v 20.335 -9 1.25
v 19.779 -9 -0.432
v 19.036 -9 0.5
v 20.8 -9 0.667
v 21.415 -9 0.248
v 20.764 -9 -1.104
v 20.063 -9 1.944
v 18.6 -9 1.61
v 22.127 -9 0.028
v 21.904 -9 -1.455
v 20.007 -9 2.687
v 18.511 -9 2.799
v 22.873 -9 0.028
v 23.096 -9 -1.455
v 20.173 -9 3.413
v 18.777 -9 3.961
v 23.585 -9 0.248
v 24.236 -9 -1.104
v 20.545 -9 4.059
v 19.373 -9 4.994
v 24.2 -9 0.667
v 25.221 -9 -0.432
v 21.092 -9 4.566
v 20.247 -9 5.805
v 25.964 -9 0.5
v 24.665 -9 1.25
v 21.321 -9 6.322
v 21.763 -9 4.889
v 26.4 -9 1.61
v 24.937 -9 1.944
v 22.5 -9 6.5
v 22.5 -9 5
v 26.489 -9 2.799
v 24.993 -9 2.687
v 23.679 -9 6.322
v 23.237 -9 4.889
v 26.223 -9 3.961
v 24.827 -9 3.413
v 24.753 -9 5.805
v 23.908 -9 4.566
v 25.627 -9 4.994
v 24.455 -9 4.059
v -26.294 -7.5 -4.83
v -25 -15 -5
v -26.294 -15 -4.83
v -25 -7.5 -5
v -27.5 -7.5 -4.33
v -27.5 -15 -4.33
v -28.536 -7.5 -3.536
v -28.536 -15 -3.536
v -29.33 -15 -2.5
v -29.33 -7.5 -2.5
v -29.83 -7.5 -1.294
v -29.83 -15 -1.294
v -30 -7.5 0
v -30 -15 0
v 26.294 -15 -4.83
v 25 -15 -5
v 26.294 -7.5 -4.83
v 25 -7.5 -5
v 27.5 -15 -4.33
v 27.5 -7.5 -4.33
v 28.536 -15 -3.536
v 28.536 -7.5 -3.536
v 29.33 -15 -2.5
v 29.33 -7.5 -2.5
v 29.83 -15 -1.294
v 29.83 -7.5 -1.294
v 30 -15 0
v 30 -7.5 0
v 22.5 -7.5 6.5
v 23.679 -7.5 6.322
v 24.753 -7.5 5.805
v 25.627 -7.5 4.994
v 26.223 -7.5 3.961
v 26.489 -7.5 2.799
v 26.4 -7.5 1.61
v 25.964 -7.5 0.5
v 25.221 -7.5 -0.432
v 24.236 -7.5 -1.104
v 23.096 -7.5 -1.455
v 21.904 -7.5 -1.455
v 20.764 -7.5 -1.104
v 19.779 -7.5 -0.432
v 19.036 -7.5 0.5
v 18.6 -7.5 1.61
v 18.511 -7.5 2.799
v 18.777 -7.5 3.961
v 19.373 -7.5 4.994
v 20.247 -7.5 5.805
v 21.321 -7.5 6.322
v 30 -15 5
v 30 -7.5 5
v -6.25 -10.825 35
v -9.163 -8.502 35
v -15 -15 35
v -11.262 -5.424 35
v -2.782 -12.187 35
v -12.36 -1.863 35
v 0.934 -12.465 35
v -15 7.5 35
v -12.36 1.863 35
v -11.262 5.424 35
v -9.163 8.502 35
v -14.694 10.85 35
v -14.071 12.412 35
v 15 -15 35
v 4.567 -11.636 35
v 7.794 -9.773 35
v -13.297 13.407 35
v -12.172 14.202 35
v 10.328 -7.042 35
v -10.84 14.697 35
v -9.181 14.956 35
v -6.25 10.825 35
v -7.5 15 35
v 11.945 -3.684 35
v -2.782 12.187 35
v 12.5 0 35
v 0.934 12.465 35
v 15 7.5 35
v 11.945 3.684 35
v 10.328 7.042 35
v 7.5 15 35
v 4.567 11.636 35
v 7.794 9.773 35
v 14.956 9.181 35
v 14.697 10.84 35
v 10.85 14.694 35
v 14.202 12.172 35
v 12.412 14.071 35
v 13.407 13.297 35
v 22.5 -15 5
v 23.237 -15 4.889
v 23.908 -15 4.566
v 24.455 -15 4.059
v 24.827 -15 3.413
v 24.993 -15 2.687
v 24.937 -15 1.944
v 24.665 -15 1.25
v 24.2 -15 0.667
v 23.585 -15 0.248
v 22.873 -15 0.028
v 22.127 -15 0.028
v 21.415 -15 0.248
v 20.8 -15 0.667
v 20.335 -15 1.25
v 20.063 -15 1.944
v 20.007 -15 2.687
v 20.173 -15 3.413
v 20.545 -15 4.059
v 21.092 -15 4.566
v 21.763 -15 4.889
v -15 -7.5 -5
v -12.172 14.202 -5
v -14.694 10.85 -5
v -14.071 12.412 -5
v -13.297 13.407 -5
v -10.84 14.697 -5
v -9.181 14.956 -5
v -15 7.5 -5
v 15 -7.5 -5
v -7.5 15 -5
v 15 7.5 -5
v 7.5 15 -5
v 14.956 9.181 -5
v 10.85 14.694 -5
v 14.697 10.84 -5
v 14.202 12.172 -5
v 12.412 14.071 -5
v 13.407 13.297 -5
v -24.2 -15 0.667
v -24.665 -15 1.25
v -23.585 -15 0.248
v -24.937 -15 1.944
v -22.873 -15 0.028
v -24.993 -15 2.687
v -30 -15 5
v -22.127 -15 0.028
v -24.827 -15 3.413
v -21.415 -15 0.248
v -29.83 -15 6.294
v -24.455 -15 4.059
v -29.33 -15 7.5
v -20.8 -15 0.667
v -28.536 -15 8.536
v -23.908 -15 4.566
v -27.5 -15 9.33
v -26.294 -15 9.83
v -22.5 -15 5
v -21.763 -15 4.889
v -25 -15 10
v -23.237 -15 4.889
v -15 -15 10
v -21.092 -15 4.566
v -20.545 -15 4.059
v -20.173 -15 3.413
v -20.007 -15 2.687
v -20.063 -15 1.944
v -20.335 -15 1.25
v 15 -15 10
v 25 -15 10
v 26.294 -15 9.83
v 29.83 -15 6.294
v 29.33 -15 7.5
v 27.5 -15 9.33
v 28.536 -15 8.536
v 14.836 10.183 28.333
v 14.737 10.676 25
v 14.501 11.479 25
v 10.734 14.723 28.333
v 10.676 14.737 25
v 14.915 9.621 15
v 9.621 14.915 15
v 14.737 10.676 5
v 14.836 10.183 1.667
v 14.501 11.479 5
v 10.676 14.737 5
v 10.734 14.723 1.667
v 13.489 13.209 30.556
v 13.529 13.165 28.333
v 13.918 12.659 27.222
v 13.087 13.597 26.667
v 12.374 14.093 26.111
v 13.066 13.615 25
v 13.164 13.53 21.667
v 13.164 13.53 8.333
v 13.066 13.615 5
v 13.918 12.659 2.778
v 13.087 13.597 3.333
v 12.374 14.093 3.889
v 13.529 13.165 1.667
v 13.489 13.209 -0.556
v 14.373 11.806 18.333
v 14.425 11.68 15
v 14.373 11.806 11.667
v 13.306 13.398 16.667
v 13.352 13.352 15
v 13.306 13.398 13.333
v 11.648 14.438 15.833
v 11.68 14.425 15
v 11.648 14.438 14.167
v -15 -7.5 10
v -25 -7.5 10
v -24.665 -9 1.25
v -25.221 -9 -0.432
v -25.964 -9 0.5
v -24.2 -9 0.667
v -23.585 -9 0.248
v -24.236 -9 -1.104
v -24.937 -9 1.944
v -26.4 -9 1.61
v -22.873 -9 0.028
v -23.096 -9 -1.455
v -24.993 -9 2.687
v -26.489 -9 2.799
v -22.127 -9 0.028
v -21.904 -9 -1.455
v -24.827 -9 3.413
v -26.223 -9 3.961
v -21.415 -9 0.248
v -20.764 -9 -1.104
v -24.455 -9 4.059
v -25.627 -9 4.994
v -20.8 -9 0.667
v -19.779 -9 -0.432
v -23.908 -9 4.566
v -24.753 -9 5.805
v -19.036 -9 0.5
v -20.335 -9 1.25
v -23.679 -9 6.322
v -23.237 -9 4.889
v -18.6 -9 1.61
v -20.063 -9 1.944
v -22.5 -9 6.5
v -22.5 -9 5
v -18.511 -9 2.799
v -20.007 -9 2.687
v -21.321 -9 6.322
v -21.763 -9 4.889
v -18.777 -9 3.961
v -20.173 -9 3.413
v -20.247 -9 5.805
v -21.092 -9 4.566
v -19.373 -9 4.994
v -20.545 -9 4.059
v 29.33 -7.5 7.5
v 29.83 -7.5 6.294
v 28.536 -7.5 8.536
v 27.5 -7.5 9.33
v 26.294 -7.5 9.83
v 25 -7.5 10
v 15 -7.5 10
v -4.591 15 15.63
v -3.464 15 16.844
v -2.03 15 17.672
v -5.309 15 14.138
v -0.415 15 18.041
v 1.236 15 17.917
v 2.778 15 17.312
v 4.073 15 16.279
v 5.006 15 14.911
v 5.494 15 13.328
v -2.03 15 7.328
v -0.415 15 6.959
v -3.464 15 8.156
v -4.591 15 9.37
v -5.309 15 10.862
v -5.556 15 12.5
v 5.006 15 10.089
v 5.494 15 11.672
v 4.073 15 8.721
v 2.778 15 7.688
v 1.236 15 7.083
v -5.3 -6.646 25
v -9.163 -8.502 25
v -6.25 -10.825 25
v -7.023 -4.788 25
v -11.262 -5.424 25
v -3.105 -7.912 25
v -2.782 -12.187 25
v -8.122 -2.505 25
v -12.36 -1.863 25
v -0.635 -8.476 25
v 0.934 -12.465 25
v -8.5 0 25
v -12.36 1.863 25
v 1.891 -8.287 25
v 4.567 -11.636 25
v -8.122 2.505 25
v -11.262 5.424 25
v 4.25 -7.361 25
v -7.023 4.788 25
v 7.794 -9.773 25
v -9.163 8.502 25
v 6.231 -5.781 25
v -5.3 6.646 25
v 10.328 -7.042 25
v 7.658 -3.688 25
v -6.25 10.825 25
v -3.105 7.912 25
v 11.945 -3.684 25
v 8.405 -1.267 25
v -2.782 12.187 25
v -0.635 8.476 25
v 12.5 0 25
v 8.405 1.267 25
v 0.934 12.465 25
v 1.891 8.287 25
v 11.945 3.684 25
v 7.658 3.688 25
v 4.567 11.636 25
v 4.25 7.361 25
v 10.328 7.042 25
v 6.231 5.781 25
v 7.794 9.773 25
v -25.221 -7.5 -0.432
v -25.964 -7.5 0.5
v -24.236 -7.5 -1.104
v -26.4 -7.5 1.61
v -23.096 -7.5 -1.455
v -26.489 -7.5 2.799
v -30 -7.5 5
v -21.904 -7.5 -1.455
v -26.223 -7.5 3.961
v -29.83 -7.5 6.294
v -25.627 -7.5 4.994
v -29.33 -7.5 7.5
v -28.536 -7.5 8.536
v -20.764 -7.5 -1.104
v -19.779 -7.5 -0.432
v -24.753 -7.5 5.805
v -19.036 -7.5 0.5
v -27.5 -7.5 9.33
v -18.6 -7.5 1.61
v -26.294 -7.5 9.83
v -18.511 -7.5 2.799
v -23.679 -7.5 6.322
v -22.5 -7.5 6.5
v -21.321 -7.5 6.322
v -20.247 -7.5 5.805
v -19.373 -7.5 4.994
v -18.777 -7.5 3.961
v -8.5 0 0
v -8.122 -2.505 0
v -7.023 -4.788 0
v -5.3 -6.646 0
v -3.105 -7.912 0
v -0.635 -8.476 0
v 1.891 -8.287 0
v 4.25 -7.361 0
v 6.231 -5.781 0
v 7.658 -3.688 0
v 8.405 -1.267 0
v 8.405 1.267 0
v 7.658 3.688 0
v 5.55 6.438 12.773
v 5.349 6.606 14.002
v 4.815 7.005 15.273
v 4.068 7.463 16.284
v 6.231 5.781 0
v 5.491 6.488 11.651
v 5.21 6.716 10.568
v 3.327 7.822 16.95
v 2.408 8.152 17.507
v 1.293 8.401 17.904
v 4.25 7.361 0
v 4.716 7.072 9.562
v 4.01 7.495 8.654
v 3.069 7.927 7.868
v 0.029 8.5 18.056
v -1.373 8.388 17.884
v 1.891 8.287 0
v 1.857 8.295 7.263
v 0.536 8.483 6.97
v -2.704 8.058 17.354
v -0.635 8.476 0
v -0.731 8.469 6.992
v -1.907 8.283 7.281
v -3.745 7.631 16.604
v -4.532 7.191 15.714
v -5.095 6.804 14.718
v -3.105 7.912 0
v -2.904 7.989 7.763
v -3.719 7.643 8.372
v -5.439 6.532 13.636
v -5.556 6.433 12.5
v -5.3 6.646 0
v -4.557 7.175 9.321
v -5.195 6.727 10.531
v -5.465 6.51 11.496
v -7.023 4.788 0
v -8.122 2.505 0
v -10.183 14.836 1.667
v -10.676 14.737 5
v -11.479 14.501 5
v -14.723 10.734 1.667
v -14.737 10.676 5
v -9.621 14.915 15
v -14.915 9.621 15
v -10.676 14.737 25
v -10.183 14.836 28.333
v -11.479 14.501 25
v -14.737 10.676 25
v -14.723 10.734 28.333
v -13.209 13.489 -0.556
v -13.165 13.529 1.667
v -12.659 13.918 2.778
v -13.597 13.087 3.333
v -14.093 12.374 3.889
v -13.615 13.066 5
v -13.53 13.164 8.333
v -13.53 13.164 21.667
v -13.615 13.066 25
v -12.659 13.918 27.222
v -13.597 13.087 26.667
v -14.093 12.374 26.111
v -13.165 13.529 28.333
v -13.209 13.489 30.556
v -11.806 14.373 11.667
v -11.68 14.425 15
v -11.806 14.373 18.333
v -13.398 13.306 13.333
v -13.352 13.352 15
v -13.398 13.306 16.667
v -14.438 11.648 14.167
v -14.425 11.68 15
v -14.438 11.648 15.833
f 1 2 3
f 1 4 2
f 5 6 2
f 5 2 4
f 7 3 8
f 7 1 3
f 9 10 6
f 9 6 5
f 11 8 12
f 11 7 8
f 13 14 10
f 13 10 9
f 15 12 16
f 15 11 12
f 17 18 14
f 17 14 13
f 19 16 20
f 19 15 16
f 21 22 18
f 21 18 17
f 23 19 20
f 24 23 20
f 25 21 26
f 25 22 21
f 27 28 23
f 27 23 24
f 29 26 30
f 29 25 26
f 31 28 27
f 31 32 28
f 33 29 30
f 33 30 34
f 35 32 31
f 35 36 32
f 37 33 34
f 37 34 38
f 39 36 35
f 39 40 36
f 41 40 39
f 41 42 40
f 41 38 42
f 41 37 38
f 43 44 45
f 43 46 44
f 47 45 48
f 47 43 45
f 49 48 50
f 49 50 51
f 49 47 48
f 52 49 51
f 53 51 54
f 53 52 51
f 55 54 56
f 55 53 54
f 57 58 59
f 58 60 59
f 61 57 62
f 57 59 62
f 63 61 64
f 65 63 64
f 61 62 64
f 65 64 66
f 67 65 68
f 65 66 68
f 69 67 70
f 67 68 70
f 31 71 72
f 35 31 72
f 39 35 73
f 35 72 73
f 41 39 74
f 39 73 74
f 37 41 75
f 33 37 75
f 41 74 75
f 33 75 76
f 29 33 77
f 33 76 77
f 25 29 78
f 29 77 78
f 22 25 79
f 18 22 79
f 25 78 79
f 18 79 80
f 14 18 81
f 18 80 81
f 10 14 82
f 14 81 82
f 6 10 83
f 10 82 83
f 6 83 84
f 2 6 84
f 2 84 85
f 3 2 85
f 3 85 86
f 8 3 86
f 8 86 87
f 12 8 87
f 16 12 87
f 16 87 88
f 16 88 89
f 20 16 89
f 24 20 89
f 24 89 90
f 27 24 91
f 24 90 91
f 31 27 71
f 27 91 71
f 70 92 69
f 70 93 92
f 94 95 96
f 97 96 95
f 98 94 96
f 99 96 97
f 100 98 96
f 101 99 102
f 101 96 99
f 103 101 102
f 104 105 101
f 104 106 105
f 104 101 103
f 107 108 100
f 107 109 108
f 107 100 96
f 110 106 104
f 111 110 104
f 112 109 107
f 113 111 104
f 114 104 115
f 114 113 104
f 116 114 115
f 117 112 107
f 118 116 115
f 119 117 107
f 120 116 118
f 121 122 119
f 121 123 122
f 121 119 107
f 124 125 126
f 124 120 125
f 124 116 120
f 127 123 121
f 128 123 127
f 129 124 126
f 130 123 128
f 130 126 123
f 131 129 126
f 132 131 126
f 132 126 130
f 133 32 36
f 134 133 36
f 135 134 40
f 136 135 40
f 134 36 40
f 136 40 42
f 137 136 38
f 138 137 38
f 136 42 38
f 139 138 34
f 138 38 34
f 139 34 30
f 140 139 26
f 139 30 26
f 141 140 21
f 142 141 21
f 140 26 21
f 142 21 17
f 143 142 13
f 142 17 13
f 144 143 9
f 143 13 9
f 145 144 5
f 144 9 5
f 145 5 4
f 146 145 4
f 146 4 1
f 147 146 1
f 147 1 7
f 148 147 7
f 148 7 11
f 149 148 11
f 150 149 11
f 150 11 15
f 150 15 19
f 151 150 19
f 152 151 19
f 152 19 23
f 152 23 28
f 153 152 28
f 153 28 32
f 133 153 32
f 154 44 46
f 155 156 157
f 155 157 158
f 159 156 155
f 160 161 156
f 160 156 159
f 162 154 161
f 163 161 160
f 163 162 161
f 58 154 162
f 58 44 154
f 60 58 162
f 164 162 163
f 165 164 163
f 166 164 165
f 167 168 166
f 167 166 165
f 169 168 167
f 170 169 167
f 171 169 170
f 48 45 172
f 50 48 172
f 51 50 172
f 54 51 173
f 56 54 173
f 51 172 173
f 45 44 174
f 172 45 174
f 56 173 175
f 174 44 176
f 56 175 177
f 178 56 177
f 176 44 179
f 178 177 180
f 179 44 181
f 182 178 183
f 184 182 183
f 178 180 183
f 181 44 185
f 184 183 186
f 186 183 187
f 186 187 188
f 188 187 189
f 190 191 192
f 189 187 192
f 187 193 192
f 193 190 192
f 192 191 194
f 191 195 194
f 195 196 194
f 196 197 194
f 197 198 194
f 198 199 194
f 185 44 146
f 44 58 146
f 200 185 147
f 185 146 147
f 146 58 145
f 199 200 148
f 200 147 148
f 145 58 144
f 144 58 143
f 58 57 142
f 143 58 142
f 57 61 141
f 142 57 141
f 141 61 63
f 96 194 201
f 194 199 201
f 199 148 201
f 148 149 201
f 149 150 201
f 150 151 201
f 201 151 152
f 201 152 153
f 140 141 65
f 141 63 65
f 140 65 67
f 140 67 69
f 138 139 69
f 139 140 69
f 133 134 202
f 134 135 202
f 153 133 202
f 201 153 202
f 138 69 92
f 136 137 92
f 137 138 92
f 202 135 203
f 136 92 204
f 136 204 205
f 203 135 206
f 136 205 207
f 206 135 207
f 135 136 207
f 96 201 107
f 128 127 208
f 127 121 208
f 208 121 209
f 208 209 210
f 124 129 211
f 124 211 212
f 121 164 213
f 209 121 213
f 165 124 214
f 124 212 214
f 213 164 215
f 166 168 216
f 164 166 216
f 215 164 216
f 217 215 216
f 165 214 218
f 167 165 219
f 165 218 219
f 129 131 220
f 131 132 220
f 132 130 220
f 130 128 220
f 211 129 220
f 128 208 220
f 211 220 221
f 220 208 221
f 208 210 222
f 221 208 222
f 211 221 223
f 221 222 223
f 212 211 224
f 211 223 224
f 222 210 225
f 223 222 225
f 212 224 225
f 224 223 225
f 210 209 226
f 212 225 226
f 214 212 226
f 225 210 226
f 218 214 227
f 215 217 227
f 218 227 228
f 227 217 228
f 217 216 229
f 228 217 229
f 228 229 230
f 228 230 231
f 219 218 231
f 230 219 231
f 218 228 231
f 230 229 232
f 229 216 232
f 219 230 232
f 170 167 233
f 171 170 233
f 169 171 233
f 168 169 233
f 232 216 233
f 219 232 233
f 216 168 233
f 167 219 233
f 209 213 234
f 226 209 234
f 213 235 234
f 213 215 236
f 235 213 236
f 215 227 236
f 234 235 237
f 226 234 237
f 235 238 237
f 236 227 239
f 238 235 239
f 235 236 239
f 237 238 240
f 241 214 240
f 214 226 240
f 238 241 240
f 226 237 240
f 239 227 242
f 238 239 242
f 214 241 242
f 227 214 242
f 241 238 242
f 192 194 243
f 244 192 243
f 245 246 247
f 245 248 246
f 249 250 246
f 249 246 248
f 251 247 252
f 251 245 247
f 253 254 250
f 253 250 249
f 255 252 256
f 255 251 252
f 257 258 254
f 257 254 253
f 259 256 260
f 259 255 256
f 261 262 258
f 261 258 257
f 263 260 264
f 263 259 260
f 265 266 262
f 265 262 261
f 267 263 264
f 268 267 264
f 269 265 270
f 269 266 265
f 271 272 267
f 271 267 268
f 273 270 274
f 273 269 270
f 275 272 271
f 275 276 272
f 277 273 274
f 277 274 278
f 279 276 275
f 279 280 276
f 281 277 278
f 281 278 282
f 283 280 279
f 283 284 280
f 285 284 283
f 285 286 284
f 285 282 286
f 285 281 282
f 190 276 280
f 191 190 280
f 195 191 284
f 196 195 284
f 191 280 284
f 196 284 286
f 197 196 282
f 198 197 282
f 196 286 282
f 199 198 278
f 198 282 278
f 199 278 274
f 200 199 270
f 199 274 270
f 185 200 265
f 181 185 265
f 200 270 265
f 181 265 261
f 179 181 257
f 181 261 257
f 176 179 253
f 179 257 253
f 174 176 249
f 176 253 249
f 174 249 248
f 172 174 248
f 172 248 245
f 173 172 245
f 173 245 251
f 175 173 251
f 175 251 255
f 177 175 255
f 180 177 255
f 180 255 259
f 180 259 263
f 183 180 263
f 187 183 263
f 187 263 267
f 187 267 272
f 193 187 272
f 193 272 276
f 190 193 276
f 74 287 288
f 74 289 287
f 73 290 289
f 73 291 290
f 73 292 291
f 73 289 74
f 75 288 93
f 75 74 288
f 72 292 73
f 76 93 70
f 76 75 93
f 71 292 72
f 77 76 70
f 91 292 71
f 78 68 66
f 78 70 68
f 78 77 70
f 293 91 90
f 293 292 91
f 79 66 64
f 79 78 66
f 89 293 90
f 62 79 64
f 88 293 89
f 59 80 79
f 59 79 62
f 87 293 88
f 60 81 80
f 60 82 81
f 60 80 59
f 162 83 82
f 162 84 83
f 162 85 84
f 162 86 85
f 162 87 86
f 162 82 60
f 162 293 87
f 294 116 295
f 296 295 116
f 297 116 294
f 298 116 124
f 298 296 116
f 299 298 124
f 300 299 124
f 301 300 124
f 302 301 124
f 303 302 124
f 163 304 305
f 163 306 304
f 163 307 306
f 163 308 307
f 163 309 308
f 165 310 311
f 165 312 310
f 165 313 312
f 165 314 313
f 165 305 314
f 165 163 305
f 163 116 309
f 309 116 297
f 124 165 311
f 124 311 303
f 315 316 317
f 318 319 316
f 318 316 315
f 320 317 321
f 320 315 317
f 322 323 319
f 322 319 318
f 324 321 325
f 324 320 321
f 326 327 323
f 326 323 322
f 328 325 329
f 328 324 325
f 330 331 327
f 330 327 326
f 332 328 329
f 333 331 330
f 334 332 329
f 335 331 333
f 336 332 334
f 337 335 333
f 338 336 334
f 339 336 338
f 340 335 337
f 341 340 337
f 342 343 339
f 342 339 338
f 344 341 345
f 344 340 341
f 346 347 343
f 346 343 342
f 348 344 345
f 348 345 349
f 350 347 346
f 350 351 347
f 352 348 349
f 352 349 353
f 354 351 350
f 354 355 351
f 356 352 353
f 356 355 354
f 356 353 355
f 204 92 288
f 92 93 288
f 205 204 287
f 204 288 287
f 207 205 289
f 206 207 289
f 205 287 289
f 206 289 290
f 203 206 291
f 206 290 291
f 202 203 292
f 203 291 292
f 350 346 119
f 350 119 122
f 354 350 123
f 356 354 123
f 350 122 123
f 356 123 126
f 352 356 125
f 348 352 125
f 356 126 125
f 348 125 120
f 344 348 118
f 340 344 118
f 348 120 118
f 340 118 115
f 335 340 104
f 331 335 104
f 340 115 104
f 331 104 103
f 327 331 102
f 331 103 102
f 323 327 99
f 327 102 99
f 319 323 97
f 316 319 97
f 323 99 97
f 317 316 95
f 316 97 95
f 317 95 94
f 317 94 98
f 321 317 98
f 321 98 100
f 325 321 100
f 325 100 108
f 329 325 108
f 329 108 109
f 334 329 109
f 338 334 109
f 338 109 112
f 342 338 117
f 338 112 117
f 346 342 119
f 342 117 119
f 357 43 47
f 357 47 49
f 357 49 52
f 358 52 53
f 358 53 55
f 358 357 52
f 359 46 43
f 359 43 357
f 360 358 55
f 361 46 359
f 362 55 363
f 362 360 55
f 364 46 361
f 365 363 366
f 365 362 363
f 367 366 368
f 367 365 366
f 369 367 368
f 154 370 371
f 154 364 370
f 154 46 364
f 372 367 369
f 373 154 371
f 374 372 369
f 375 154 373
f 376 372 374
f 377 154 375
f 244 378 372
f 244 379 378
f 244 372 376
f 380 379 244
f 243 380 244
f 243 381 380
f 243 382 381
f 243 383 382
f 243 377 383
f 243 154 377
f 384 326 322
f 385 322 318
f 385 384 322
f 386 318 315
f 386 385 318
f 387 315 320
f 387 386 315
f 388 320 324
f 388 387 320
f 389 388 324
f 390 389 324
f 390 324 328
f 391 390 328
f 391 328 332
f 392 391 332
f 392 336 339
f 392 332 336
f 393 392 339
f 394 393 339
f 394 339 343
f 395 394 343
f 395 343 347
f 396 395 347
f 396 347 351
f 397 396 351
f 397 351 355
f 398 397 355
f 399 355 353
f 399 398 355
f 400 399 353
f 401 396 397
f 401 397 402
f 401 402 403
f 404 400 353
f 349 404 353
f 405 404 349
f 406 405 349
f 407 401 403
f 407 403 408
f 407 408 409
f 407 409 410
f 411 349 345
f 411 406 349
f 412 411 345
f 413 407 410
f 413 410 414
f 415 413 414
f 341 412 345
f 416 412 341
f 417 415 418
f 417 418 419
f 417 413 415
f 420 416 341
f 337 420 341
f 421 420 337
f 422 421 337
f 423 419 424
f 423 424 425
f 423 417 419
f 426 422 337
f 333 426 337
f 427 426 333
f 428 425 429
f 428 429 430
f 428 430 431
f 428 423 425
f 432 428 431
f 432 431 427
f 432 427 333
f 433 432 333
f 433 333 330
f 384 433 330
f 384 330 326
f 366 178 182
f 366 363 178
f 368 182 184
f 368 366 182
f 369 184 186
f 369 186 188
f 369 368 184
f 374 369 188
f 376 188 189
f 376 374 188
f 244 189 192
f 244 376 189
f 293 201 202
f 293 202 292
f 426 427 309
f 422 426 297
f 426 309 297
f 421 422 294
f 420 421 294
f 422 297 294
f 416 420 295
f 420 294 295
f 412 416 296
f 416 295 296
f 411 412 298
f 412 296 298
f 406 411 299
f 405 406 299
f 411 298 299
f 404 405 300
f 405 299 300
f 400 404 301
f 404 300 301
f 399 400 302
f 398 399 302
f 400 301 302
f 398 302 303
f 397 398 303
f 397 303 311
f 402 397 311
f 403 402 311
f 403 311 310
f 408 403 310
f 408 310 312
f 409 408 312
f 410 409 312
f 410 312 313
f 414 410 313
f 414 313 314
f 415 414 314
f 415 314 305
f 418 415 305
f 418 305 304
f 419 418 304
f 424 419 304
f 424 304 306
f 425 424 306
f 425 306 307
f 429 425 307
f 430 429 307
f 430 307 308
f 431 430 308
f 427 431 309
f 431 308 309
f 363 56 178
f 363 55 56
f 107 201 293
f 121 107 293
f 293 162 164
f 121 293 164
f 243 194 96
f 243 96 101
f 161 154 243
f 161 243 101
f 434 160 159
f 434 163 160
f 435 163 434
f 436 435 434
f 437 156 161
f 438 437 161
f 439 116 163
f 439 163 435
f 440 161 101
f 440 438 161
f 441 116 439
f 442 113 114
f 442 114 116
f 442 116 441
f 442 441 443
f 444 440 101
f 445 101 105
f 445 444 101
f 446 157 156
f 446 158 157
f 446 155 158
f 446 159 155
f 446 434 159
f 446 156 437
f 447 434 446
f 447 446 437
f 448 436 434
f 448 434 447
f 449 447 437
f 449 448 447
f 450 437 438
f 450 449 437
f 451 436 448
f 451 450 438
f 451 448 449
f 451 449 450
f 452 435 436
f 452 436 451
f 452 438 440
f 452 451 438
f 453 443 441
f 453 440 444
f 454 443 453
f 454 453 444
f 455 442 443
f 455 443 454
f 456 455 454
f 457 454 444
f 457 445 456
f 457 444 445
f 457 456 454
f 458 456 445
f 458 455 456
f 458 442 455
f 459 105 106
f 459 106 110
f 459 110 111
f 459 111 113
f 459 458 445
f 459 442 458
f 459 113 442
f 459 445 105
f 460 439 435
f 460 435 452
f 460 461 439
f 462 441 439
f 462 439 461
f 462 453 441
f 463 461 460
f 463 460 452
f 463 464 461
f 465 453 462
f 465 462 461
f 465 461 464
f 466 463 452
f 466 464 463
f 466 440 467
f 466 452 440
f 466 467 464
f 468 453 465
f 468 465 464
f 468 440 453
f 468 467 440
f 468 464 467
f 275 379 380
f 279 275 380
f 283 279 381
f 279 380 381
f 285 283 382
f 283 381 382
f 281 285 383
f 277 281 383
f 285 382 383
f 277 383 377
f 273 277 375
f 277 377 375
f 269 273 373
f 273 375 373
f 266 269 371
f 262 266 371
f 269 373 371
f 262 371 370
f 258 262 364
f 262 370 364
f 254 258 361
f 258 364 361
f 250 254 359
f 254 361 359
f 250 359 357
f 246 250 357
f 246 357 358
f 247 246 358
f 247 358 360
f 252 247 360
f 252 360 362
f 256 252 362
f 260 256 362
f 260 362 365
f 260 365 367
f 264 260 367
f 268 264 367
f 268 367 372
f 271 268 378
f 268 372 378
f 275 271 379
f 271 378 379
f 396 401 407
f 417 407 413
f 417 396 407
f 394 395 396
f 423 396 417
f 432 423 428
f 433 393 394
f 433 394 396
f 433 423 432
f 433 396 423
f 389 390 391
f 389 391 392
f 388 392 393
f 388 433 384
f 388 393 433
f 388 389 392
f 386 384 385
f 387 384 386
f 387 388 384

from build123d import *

# Parameters (mm, degrees)
BOSS_EXTRUDE1_DEPTH      = 35
BOSS_EXTRUDE1_DEPTH_BACK = 5
SKETCH1_W                = 30
SKETCH1_H                = 30
FILLET1_SIZE             = 7.5
SKETCH2_R                = 8.5
CUT_EXTRUDE1_DEPTH       = 60
SKETCH3_W                = 15
SKETCH3_H                = 7.5
BOSS_EXTRUDE2_DEPTH      = 15
SKETCH5_W                = 15
SKETCH5_H                = 7.5
BOSS_EXTRUDE4_DEPTH      = 15
SKETCH11_R               = 12.5
CUT_EXTRUDE3_DEPTH       = 10
FILLET8_R                = 5
SKETCH15_R               = 4
CUT_EXTRUDE5_DEPTH       = 1.5
SKETCH19_R               = 5.55625
CUT_EXTRUDE10_DEPTH      = 11.5
SKETCH21_R               = 2.5
CUT_EXTRUDE11_DEPTH      = 11.5


with BuildPart() as part:
    # Sketch1 → Boss-Extrude1 (new, two sides: drawn at the far end of the back side and taken through both)
    with BuildSketch(Plane.XY.offset(-BOSS_EXTRUDE1_DEPTH_BACK)):
        Rectangle(SKETCH1_W, SKETCH1_H)
    extrude(amount=BOSS_EXTRUDE1_DEPTH + BOSS_EXTRUDE1_DEPTH_BACK)

    # Fillet1
    # a fillet whose section is not a circle: 7.5 mm, written as the material it takes off along each edge
    with BuildSketch(Plane(origin=(-15, 15, 53.75), x_dir=(1, 0, 0), z_dir=(0, 0, -1))) as fillet1_piece_1:
        with BuildLine():
            add(Edge.make_bspline([(FILLET1_SIZE, 0), (FILLET1_SIZE * 0.831801948466, 0), (FILLET1_SIZE * 0.663603896932, 0), (FILLET1_SIZE * 0.292893218813, FILLET1_SIZE * 0.0716919198361), (FILLET1_SIZE * 0.0716919198361, FILLET1_SIZE * 0.292893218813), (0, FILLET1_SIZE * 0.663603896932), (0, FILLET1_SIZE * 0.831801948466), (0, FILLET1_SIZE)], knots=[0, 0, 0, 0, 0, 0, 0.5, 0.5, 1, 1, 1, 1, 1, 1], degree=5))
            Line((0, FILLET1_SIZE), (0, 0))
            Line((0, 0), (FILLET1_SIZE, 0))
        make_face()
    extrude(amount=77.5, mode=Mode.SUBTRACT)
    with BuildSketch(Plane(origin=(15, 15, -23.75), x_dir=(0, -1, 0), z_dir=(0, 0, 1))) as fillet1_piece_2:
        with BuildLine():
            add(Edge.make_bspline([(FILLET1_SIZE, 0), (FILLET1_SIZE * 0.831801948466, 0), (FILLET1_SIZE * 0.663603896932, 0), (FILLET1_SIZE * 0.292893218813, -FILLET1_SIZE * 0.0716919198361), (FILLET1_SIZE * 0.0716919198361, -FILLET1_SIZE * 0.292893218813), (0, -FILLET1_SIZE * 0.663603896932), (0, -FILLET1_SIZE * 0.831801948466), (0, -FILLET1_SIZE)], knots=[0, 0, 0, 0, 0, 0, 0.5, 0.5, 1, 1, 1, 1, 1, 1], degree=5))
            Line((0, -FILLET1_SIZE), (0, 0))
            Line((0, 0), (FILLET1_SIZE, 0))
        make_face()
    extrude(amount=77.5, mode=Mode.SUBTRACT)

    # Sketch2 → Cut-Extrude1 (cut)
    with BuildSketch(Plane.XY):
        with Locations(Location((0, 0, 0), (0, 0, 180))):
            Circle(SKETCH2_R)
    extrude(amount=CUT_EXTRUDE1_DEPTH, mode=Mode.SUBTRACT)

    # Sketch3 → Boss-Extrude2 (add)
    with BuildSketch(Plane(origin=(15, 0, 0), x_dir=(0, 0, -1), z_dir=(1, 0, 0))):
        with Locations((-2.5, -11.25)):
            Rectangle(SKETCH3_W, SKETCH3_H)
    extrude(amount=BOSS_EXTRUDE2_DEPTH)

    # Sketch5 → Boss-Extrude4 (add)
    with BuildSketch(Plane.ZY.offset(15)):
        with Locations((2.5, -11.25)):
            Rectangle(SKETCH5_W, SKETCH5_H)
    extrude(amount=BOSS_EXTRUDE4_DEPTH)

    # Sketch11 → Cut-Extrude3 (cut)
    with BuildSketch(Plane.XY.offset(35)):
        Circle(SKETCH11_R)
    extrude(amount=-CUT_EXTRUDE3_DEPTH, mode=Mode.SUBTRACT)

    # Fillet8
    fillet8_edges = [part.edges().sort_by_distance(p)[0] for p in [
        (30, -11.25, -5),
        (30, -11.25, 10),
        (-30, -11.25, -5),
        (-30, -11.25, 10),
    ]]
    fillet(fillet8_edges, radius=FILLET8_R)

    # Sketch15 → Cut-Extrude5 (cut)
    with BuildSketch(Plane(origin=(0, -7.5, 0), x_dir=(1, 0, 0), z_dir=(0, 1, 0))):
        with Locations(Location((22.5, -2.5, 0), (0, 0, 270))):
            Circle(SKETCH15_R)
        with Locations(Location((-22.5, -2.5, 0), (0, 0, 270))):
            Circle(SKETCH15_R)
    extrude(amount=-CUT_EXTRUDE5_DEPTH, mode=Mode.SUBTRACT)

    # Sketch19 → Cut-Extrude10 (cut)
    with BuildSketch(Plane(origin=(0, 15, 0), x_dir=(1, 0, 0), z_dir=(0, 1, 0))):
        with Locations(Location((0, -12.5, 0), (0, 0, 180))):
            Circle(SKETCH19_R)
    extrude(amount=-CUT_EXTRUDE10_DEPTH, mode=Mode.SUBTRACT)

    # Sketch21 → Cut-Extrude11 (cut)
    with BuildSketch(Plane(origin=(0, -9, 0), x_dir=(1, 0, 0), z_dir=(0, 1, 0))):
        with Locations(Location((-22.5, -2.5, 0), (0, 0, 270))):
            Circle(SKETCH21_R)
        with Locations(Location((22.5, -2.5, 0), (0, 0, 270))):
            Circle(SKETCH21_R)
    extrude(amount=-CUT_EXTRUDE11_DEPTH, mode=Mode.SUBTRACT)


solid = part.part
